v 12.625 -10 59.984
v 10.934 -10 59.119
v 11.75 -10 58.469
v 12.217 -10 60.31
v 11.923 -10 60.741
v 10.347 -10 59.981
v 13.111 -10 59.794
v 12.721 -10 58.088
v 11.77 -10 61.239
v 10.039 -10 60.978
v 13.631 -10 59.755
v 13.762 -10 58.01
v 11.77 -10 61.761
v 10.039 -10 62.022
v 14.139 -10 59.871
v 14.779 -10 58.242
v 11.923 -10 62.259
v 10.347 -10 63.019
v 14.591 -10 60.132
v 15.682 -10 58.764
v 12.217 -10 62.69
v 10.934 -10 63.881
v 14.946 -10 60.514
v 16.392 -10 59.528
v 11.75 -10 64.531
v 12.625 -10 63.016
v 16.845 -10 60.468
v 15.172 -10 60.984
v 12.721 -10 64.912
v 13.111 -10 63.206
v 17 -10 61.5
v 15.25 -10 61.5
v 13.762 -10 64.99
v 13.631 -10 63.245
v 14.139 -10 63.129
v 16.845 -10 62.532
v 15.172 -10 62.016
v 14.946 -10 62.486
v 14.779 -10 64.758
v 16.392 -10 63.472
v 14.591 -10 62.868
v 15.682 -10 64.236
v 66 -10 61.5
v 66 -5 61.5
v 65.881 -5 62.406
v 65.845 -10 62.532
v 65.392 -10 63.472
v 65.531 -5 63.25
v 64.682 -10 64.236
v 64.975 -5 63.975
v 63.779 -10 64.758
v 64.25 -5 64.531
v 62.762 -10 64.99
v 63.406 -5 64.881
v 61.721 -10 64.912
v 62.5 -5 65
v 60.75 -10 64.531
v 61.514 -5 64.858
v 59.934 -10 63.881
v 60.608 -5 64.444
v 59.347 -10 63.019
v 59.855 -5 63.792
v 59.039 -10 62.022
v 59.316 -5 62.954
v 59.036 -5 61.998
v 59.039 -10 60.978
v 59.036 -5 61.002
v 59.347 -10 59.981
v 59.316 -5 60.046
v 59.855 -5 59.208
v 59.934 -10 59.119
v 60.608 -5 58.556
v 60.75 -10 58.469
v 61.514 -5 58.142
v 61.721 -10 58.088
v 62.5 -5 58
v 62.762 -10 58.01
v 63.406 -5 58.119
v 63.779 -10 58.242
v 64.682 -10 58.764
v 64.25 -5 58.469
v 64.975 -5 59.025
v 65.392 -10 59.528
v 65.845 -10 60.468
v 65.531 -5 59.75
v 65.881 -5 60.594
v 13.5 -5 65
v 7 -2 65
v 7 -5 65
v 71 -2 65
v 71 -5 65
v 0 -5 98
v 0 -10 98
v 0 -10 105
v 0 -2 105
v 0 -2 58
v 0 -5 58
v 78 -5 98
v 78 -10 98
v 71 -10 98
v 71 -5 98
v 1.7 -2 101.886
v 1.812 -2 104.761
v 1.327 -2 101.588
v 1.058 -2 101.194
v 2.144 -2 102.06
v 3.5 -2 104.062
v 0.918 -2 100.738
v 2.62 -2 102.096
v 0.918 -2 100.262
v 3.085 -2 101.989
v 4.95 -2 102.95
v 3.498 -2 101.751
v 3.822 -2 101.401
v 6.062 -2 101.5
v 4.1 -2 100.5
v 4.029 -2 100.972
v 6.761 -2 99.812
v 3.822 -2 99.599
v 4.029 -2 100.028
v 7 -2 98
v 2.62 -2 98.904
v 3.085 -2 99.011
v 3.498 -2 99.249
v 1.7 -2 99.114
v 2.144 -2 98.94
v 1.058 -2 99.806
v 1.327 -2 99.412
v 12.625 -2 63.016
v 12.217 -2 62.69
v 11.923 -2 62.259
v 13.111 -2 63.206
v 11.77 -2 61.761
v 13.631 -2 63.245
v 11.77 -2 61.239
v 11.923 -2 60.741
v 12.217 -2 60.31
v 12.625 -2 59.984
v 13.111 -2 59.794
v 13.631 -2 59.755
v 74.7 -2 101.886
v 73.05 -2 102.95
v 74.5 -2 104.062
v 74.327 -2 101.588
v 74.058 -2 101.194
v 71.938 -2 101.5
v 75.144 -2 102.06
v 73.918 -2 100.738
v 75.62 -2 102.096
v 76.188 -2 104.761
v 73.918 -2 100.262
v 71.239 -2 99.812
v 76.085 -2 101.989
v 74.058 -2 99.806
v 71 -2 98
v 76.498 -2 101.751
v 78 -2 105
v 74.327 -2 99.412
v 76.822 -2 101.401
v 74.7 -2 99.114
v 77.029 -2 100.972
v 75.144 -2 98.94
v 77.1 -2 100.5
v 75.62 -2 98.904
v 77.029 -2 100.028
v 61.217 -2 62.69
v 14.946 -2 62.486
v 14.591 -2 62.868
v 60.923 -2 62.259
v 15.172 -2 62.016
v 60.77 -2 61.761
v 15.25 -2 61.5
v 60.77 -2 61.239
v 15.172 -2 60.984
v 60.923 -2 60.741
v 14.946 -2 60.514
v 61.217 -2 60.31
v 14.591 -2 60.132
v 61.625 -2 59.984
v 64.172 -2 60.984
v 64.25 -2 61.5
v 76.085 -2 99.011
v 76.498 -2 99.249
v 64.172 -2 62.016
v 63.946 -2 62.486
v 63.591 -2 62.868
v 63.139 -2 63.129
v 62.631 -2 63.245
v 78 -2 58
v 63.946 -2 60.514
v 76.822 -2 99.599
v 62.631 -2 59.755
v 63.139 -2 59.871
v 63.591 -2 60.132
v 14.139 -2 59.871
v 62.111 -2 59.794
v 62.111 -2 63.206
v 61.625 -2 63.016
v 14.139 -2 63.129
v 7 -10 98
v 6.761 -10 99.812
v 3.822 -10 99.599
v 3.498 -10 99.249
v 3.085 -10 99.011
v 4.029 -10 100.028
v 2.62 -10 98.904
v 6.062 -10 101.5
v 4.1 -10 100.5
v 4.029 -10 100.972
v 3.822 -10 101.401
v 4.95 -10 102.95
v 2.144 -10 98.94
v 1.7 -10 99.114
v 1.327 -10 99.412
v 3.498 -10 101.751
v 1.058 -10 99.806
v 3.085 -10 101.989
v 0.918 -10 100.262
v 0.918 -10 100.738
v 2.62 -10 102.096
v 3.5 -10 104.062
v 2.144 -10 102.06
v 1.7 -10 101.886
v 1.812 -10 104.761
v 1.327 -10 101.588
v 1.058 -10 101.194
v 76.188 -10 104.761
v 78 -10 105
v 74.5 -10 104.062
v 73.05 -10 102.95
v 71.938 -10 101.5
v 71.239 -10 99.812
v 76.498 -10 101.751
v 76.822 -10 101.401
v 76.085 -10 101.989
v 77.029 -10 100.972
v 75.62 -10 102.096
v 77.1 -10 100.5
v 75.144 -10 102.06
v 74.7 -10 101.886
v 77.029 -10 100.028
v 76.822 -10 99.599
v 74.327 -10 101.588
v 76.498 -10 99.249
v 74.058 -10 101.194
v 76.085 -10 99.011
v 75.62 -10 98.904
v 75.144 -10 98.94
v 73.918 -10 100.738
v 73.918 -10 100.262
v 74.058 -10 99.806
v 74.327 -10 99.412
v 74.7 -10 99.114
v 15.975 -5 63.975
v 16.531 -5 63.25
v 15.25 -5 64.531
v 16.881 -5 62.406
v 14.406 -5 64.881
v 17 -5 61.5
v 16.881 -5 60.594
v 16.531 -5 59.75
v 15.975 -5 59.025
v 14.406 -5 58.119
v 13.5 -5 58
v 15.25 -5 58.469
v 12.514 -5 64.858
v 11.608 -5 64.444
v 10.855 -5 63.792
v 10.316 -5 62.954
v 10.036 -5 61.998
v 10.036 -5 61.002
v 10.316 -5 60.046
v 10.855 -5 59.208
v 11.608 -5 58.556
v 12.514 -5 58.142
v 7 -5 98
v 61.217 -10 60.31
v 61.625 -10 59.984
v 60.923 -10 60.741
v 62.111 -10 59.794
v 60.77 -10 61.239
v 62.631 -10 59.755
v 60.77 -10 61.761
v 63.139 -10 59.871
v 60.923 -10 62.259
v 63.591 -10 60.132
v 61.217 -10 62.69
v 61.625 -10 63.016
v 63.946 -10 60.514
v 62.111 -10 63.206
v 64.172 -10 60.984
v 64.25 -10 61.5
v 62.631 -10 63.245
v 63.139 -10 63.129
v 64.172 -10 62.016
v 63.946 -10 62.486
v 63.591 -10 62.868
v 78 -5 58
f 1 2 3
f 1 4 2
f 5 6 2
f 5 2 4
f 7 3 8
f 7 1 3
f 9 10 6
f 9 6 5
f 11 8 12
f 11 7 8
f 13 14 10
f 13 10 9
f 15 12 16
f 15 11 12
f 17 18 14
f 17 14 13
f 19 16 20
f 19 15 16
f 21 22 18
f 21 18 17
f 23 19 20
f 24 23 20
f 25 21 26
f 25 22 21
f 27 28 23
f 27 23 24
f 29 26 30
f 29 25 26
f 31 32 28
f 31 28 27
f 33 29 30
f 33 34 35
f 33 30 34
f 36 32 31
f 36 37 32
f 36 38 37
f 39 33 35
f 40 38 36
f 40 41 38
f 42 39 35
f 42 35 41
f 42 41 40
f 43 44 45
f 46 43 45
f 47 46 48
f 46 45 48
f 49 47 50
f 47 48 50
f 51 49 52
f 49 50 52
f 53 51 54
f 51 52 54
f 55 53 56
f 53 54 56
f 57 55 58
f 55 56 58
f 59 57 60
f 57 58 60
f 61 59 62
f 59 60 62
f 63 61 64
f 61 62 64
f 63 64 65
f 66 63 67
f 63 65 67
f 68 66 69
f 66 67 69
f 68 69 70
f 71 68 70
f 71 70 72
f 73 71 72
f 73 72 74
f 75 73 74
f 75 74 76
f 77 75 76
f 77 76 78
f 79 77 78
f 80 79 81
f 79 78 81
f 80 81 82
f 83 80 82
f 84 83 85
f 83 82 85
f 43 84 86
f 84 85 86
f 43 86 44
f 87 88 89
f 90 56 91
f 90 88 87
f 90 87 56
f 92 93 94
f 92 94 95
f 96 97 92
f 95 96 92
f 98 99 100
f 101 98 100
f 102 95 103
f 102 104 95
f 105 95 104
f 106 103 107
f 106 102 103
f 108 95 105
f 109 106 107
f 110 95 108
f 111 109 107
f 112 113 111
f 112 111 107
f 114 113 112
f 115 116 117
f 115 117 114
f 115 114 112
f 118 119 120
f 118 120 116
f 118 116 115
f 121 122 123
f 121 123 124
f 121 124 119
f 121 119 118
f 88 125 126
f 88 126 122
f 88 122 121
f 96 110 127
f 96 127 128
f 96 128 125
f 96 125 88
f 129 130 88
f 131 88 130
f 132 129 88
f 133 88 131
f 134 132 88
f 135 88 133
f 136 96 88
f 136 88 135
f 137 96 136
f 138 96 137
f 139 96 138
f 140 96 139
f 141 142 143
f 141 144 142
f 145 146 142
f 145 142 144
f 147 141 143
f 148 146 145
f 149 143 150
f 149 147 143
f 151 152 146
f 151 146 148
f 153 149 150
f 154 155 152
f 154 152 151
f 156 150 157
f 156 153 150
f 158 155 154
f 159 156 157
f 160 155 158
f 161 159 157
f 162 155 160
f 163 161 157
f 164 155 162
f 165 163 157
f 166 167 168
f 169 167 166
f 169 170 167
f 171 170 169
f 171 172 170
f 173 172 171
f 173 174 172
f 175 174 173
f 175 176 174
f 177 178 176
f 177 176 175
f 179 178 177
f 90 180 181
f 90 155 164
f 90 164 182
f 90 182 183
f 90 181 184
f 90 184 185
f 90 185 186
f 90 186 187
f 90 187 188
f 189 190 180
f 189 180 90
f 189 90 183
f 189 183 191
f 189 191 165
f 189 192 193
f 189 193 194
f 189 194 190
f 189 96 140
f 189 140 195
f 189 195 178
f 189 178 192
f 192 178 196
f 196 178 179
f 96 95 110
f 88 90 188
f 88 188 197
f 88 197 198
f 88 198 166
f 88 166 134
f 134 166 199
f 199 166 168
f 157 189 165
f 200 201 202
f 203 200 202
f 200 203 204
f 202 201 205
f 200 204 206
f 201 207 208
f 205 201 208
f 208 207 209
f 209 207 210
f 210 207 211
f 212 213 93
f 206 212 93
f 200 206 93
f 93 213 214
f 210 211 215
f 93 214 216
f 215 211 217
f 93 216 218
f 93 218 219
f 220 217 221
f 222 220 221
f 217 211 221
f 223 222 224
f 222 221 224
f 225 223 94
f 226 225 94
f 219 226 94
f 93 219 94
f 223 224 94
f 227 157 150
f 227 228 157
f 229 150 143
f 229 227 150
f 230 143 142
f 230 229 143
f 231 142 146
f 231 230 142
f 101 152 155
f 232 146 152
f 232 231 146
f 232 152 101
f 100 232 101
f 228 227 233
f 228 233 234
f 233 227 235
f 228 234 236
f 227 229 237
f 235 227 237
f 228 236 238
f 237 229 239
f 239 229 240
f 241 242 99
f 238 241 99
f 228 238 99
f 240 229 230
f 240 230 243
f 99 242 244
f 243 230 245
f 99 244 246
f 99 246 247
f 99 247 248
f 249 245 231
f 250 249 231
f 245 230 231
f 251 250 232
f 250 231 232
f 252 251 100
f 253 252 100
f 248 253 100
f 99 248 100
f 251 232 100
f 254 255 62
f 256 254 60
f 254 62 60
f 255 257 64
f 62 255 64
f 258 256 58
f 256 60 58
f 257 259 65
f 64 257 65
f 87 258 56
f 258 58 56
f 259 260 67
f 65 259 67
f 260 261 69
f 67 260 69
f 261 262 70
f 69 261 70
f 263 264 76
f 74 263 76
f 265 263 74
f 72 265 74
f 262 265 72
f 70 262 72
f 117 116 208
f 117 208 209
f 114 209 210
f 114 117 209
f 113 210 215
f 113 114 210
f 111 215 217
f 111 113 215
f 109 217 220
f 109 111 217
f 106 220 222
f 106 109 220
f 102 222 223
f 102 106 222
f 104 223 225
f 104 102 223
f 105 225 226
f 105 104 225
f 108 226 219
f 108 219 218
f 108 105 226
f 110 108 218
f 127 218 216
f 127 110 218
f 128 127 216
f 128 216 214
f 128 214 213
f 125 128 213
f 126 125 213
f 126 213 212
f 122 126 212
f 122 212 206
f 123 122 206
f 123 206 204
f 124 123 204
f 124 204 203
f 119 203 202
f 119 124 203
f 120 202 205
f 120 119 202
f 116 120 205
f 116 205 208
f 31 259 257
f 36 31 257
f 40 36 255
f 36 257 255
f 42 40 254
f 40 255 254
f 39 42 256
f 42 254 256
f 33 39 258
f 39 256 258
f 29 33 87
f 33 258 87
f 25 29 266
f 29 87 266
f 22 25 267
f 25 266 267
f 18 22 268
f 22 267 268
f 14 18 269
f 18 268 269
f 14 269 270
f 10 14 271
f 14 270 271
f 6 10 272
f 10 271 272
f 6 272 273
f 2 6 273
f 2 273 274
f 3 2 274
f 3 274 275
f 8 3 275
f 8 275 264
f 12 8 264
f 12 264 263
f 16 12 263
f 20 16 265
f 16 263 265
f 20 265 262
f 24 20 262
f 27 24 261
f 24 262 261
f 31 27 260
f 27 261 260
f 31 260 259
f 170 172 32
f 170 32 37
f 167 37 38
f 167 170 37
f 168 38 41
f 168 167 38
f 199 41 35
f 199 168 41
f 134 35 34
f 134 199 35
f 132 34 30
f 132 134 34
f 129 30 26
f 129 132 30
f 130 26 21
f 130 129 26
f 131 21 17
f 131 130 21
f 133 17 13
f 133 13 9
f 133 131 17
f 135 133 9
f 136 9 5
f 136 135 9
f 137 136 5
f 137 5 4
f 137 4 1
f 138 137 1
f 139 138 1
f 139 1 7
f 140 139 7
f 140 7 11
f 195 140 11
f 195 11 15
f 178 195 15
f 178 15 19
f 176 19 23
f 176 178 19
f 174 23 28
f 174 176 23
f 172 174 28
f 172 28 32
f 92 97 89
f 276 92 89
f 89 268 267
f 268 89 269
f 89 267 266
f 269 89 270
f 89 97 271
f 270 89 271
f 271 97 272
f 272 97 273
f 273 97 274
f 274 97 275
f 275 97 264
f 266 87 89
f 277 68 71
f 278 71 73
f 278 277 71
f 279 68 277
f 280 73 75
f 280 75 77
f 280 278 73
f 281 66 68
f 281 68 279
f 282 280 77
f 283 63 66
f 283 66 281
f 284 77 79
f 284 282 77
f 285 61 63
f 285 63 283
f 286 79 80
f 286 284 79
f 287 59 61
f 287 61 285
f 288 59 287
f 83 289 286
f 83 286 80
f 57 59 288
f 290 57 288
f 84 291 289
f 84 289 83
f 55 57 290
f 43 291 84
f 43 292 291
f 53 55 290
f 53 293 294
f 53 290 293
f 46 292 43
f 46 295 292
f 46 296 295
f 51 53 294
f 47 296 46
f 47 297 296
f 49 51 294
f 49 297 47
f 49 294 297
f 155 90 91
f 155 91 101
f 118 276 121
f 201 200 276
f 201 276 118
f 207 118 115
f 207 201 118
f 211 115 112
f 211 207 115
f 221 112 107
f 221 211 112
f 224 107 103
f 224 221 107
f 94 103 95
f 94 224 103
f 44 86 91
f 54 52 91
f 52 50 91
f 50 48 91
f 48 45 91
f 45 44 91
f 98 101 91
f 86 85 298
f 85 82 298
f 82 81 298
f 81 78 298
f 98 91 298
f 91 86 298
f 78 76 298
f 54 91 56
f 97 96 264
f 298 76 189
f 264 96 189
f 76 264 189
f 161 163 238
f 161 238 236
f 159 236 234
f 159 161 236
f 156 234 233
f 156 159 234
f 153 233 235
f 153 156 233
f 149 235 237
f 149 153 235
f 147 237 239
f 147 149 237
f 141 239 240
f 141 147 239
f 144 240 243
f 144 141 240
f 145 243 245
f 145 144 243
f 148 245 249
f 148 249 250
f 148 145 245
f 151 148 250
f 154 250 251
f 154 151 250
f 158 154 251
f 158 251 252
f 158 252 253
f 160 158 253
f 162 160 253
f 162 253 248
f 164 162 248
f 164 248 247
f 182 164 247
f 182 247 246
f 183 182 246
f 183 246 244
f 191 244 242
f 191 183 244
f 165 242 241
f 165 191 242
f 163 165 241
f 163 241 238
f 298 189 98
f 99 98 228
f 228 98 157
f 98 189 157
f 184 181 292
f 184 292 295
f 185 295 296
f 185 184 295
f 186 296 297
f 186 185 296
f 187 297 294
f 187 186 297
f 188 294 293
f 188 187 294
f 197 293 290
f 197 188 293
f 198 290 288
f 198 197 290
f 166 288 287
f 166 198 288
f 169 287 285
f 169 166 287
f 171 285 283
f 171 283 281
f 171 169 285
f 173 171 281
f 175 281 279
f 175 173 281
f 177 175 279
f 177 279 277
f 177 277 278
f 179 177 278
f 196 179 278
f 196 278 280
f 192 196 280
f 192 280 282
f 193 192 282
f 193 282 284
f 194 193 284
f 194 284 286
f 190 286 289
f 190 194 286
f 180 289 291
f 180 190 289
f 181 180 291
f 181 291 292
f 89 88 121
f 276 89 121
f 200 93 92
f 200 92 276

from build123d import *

# Parameters (mm, degrees)
CYLINDER032_R     = 1.75
CYLINDER032_DEPTH = 8
CYLINDER035_R     = 1.75
CYLINDER035_DEPTH = 8
CYLINDER038_R     = 1.6
CYLINDER038_DEPTH = 8
CYLINDER039_R     = 1.6
CYLINDER039_DEPTH = 8
CYLINDER037_W     = 7
CYLINDER037_H     = 8
CYLINDER037_ANGLE = 90
BOX025_W          = 78
BOX025_H          = 3
BOX025_DEPTH      = 7
BOX026_W          = 40
BOX026_H          = 3
BOX026_DEPTH      = 7
CYLINDER034_R     = 3.5
CYLINDER034_DEPTH = 8
CYLINDER031_R     = 3.5
CYLINDER031_DEPTH = 8
BOX027_W          = 40
BOX027_H          = 3
BOX027_DEPTH      = 7
CYLINDER036_W     = 7
CYLINDER036_H     = 8
CYLINDER036_ANGLE = 90


with BuildPart() as cuts:
    # Cylinder032 → Cylinder032 (new body)
    with BuildSketch(Plane(origin=(13.5, -2, 61.5), x_dir=(1, 0, 0), z_dir=(0, -1, 0))):
        Circle(CYLINDER032_R)
    extrude(amount=CYLINDER032_DEPTH)


with BuildPart() as cuts001:
    # Cylinder035 → Cylinder035 (new body)
    with BuildSketch(Plane(origin=(62.5, -2, 61.5), x_dir=(1, 0, 0), z_dir=(0, -1, 0))):
        Circle(CYLINDER035_R)
    extrude(amount=CYLINDER035_DEPTH)


with BuildPart() as m3screw:
    # Cylinder038 → Cylinder038 (new body)
    with BuildSketch(Plane(origin=(75.5, -2, 100.5), x_dir=(1, 0, 0), z_dir=(0, -1, 0))):
        Circle(CYLINDER038_R)
    extrude(amount=CYLINDER038_DEPTH)


with BuildPart() as c4oldcuts:
    # Cylinder039 → Cylinder039 (new body)
    with BuildSketch(Plane(origin=(2.5, -2, 100.5), x_dir=(1, 0, 0), z_dir=(0, -1, 0))):
        Circle(CYLINDER039_R)
    extrude(amount=CYLINDER039_DEPTH)

    # Fusion016: union cuts, cuts001, m3Screw
    add(cuts.part)
    add(cuts001.part)
    add(m3screw.part)


with BuildPart() as cylinder037:
    # Cylinder037 → Cylinder037 (revolve)
    with BuildSketch(Plane(origin=(0, -2, 98), x_dir=(1, 0, 0), z_dir=(0, 0, -1))):
        with Locations((3.5, 4)):
            Rectangle(CYLINDER037_W, CYLINDER037_H)
    revolve(axis=Axis((0, -2, 98), (0, -1, 0)), revolution_arc=CYLINDER037_ANGLE)


with BuildPart() as cube020:
    # Box025 → Box025 (new body)
    with BuildSketch(Plane(origin=(0, -5, 58), x_dir=(1, 0, 0), z_dir=(0, 0, 1))):
        with Locations((39, 1.5)):
            Rectangle(BOX025_W, BOX025_H)
    extrude(amount=BOX025_DEPTH)


with BuildPart() as cube021:
    # Box026 → Box026 (new body)
    with BuildSketch(Plane(origin=(7, -5, 58), x_dir=(0, 0, 1), z_dir=(-1, 0, 0))):
        with Locations((20, 1.5)):
            Rectangle(BOX026_W, BOX026_H)
    extrude(amount=BOX026_DEPTH)


with BuildPart() as cylinder034:
    # Cylinder034 → Cylinder034 (new body)
    with BuildSketch(Plane(origin=(62.5, -2, 61.5), x_dir=(1, 0, 0), z_dir=(0, -1, 0))):
        Circle(CYLINDER034_R)
    extrude(amount=CYLINDER034_DEPTH)


with BuildPart() as cylinder031:
    # Cylinder031 → Cylinder031 (new body)
    with BuildSketch(Plane(origin=(13.5, -2, 61.5), x_dir=(1, 0, 0), z_dir=(0, -1, 0))):
        Circle(CYLINDER031_R)
    extrude(amount=CYLINDER031_DEPTH)


with BuildPart() as fusion014:
    # Box027 → Box027 (new body)
    with BuildSketch(Plane(origin=(78, -5, 58), x_dir=(0, 0, 1), z_dir=(-1, 0, 0))):
        with Locations((20, 1.5)):
            Rectangle(BOX027_W, BOX027_H)
    extrude(amount=BOX027_DEPTH)

    # Fusion014: union Cube020, Cube021, Cylinder034, Cylinder031
    add(cube020.part)
    add(cube021.part)
    add(cylinder034.part)
    add(cylinder031.part)


with BuildPart() as c4hold001:
    # Cylinder036 → Cylinder036 (revolve)
    with BuildSketch(Plane(origin=(78, -2, 98), x_dir=(0, 0, 1), z_dir=(1, 0, 0))):
        with Locations((3.5, 4)):
            Rectangle(CYLINDER036_W, CYLINDER036_H)
    revolve(axis=Axis((78, -2, 98), (0, -1, 0)), revolution_arc=CYLINDER036_ANGLE)

    # Fusion015: union Cylinder037, Fusion014
    add(cylinder037.part)
    add(fusion014.part)

    # Cut024: cut c4oldCuts
    add(c4oldcuts.part, mode=Mode.SUBTRACT)


solid = c4hold001.part
